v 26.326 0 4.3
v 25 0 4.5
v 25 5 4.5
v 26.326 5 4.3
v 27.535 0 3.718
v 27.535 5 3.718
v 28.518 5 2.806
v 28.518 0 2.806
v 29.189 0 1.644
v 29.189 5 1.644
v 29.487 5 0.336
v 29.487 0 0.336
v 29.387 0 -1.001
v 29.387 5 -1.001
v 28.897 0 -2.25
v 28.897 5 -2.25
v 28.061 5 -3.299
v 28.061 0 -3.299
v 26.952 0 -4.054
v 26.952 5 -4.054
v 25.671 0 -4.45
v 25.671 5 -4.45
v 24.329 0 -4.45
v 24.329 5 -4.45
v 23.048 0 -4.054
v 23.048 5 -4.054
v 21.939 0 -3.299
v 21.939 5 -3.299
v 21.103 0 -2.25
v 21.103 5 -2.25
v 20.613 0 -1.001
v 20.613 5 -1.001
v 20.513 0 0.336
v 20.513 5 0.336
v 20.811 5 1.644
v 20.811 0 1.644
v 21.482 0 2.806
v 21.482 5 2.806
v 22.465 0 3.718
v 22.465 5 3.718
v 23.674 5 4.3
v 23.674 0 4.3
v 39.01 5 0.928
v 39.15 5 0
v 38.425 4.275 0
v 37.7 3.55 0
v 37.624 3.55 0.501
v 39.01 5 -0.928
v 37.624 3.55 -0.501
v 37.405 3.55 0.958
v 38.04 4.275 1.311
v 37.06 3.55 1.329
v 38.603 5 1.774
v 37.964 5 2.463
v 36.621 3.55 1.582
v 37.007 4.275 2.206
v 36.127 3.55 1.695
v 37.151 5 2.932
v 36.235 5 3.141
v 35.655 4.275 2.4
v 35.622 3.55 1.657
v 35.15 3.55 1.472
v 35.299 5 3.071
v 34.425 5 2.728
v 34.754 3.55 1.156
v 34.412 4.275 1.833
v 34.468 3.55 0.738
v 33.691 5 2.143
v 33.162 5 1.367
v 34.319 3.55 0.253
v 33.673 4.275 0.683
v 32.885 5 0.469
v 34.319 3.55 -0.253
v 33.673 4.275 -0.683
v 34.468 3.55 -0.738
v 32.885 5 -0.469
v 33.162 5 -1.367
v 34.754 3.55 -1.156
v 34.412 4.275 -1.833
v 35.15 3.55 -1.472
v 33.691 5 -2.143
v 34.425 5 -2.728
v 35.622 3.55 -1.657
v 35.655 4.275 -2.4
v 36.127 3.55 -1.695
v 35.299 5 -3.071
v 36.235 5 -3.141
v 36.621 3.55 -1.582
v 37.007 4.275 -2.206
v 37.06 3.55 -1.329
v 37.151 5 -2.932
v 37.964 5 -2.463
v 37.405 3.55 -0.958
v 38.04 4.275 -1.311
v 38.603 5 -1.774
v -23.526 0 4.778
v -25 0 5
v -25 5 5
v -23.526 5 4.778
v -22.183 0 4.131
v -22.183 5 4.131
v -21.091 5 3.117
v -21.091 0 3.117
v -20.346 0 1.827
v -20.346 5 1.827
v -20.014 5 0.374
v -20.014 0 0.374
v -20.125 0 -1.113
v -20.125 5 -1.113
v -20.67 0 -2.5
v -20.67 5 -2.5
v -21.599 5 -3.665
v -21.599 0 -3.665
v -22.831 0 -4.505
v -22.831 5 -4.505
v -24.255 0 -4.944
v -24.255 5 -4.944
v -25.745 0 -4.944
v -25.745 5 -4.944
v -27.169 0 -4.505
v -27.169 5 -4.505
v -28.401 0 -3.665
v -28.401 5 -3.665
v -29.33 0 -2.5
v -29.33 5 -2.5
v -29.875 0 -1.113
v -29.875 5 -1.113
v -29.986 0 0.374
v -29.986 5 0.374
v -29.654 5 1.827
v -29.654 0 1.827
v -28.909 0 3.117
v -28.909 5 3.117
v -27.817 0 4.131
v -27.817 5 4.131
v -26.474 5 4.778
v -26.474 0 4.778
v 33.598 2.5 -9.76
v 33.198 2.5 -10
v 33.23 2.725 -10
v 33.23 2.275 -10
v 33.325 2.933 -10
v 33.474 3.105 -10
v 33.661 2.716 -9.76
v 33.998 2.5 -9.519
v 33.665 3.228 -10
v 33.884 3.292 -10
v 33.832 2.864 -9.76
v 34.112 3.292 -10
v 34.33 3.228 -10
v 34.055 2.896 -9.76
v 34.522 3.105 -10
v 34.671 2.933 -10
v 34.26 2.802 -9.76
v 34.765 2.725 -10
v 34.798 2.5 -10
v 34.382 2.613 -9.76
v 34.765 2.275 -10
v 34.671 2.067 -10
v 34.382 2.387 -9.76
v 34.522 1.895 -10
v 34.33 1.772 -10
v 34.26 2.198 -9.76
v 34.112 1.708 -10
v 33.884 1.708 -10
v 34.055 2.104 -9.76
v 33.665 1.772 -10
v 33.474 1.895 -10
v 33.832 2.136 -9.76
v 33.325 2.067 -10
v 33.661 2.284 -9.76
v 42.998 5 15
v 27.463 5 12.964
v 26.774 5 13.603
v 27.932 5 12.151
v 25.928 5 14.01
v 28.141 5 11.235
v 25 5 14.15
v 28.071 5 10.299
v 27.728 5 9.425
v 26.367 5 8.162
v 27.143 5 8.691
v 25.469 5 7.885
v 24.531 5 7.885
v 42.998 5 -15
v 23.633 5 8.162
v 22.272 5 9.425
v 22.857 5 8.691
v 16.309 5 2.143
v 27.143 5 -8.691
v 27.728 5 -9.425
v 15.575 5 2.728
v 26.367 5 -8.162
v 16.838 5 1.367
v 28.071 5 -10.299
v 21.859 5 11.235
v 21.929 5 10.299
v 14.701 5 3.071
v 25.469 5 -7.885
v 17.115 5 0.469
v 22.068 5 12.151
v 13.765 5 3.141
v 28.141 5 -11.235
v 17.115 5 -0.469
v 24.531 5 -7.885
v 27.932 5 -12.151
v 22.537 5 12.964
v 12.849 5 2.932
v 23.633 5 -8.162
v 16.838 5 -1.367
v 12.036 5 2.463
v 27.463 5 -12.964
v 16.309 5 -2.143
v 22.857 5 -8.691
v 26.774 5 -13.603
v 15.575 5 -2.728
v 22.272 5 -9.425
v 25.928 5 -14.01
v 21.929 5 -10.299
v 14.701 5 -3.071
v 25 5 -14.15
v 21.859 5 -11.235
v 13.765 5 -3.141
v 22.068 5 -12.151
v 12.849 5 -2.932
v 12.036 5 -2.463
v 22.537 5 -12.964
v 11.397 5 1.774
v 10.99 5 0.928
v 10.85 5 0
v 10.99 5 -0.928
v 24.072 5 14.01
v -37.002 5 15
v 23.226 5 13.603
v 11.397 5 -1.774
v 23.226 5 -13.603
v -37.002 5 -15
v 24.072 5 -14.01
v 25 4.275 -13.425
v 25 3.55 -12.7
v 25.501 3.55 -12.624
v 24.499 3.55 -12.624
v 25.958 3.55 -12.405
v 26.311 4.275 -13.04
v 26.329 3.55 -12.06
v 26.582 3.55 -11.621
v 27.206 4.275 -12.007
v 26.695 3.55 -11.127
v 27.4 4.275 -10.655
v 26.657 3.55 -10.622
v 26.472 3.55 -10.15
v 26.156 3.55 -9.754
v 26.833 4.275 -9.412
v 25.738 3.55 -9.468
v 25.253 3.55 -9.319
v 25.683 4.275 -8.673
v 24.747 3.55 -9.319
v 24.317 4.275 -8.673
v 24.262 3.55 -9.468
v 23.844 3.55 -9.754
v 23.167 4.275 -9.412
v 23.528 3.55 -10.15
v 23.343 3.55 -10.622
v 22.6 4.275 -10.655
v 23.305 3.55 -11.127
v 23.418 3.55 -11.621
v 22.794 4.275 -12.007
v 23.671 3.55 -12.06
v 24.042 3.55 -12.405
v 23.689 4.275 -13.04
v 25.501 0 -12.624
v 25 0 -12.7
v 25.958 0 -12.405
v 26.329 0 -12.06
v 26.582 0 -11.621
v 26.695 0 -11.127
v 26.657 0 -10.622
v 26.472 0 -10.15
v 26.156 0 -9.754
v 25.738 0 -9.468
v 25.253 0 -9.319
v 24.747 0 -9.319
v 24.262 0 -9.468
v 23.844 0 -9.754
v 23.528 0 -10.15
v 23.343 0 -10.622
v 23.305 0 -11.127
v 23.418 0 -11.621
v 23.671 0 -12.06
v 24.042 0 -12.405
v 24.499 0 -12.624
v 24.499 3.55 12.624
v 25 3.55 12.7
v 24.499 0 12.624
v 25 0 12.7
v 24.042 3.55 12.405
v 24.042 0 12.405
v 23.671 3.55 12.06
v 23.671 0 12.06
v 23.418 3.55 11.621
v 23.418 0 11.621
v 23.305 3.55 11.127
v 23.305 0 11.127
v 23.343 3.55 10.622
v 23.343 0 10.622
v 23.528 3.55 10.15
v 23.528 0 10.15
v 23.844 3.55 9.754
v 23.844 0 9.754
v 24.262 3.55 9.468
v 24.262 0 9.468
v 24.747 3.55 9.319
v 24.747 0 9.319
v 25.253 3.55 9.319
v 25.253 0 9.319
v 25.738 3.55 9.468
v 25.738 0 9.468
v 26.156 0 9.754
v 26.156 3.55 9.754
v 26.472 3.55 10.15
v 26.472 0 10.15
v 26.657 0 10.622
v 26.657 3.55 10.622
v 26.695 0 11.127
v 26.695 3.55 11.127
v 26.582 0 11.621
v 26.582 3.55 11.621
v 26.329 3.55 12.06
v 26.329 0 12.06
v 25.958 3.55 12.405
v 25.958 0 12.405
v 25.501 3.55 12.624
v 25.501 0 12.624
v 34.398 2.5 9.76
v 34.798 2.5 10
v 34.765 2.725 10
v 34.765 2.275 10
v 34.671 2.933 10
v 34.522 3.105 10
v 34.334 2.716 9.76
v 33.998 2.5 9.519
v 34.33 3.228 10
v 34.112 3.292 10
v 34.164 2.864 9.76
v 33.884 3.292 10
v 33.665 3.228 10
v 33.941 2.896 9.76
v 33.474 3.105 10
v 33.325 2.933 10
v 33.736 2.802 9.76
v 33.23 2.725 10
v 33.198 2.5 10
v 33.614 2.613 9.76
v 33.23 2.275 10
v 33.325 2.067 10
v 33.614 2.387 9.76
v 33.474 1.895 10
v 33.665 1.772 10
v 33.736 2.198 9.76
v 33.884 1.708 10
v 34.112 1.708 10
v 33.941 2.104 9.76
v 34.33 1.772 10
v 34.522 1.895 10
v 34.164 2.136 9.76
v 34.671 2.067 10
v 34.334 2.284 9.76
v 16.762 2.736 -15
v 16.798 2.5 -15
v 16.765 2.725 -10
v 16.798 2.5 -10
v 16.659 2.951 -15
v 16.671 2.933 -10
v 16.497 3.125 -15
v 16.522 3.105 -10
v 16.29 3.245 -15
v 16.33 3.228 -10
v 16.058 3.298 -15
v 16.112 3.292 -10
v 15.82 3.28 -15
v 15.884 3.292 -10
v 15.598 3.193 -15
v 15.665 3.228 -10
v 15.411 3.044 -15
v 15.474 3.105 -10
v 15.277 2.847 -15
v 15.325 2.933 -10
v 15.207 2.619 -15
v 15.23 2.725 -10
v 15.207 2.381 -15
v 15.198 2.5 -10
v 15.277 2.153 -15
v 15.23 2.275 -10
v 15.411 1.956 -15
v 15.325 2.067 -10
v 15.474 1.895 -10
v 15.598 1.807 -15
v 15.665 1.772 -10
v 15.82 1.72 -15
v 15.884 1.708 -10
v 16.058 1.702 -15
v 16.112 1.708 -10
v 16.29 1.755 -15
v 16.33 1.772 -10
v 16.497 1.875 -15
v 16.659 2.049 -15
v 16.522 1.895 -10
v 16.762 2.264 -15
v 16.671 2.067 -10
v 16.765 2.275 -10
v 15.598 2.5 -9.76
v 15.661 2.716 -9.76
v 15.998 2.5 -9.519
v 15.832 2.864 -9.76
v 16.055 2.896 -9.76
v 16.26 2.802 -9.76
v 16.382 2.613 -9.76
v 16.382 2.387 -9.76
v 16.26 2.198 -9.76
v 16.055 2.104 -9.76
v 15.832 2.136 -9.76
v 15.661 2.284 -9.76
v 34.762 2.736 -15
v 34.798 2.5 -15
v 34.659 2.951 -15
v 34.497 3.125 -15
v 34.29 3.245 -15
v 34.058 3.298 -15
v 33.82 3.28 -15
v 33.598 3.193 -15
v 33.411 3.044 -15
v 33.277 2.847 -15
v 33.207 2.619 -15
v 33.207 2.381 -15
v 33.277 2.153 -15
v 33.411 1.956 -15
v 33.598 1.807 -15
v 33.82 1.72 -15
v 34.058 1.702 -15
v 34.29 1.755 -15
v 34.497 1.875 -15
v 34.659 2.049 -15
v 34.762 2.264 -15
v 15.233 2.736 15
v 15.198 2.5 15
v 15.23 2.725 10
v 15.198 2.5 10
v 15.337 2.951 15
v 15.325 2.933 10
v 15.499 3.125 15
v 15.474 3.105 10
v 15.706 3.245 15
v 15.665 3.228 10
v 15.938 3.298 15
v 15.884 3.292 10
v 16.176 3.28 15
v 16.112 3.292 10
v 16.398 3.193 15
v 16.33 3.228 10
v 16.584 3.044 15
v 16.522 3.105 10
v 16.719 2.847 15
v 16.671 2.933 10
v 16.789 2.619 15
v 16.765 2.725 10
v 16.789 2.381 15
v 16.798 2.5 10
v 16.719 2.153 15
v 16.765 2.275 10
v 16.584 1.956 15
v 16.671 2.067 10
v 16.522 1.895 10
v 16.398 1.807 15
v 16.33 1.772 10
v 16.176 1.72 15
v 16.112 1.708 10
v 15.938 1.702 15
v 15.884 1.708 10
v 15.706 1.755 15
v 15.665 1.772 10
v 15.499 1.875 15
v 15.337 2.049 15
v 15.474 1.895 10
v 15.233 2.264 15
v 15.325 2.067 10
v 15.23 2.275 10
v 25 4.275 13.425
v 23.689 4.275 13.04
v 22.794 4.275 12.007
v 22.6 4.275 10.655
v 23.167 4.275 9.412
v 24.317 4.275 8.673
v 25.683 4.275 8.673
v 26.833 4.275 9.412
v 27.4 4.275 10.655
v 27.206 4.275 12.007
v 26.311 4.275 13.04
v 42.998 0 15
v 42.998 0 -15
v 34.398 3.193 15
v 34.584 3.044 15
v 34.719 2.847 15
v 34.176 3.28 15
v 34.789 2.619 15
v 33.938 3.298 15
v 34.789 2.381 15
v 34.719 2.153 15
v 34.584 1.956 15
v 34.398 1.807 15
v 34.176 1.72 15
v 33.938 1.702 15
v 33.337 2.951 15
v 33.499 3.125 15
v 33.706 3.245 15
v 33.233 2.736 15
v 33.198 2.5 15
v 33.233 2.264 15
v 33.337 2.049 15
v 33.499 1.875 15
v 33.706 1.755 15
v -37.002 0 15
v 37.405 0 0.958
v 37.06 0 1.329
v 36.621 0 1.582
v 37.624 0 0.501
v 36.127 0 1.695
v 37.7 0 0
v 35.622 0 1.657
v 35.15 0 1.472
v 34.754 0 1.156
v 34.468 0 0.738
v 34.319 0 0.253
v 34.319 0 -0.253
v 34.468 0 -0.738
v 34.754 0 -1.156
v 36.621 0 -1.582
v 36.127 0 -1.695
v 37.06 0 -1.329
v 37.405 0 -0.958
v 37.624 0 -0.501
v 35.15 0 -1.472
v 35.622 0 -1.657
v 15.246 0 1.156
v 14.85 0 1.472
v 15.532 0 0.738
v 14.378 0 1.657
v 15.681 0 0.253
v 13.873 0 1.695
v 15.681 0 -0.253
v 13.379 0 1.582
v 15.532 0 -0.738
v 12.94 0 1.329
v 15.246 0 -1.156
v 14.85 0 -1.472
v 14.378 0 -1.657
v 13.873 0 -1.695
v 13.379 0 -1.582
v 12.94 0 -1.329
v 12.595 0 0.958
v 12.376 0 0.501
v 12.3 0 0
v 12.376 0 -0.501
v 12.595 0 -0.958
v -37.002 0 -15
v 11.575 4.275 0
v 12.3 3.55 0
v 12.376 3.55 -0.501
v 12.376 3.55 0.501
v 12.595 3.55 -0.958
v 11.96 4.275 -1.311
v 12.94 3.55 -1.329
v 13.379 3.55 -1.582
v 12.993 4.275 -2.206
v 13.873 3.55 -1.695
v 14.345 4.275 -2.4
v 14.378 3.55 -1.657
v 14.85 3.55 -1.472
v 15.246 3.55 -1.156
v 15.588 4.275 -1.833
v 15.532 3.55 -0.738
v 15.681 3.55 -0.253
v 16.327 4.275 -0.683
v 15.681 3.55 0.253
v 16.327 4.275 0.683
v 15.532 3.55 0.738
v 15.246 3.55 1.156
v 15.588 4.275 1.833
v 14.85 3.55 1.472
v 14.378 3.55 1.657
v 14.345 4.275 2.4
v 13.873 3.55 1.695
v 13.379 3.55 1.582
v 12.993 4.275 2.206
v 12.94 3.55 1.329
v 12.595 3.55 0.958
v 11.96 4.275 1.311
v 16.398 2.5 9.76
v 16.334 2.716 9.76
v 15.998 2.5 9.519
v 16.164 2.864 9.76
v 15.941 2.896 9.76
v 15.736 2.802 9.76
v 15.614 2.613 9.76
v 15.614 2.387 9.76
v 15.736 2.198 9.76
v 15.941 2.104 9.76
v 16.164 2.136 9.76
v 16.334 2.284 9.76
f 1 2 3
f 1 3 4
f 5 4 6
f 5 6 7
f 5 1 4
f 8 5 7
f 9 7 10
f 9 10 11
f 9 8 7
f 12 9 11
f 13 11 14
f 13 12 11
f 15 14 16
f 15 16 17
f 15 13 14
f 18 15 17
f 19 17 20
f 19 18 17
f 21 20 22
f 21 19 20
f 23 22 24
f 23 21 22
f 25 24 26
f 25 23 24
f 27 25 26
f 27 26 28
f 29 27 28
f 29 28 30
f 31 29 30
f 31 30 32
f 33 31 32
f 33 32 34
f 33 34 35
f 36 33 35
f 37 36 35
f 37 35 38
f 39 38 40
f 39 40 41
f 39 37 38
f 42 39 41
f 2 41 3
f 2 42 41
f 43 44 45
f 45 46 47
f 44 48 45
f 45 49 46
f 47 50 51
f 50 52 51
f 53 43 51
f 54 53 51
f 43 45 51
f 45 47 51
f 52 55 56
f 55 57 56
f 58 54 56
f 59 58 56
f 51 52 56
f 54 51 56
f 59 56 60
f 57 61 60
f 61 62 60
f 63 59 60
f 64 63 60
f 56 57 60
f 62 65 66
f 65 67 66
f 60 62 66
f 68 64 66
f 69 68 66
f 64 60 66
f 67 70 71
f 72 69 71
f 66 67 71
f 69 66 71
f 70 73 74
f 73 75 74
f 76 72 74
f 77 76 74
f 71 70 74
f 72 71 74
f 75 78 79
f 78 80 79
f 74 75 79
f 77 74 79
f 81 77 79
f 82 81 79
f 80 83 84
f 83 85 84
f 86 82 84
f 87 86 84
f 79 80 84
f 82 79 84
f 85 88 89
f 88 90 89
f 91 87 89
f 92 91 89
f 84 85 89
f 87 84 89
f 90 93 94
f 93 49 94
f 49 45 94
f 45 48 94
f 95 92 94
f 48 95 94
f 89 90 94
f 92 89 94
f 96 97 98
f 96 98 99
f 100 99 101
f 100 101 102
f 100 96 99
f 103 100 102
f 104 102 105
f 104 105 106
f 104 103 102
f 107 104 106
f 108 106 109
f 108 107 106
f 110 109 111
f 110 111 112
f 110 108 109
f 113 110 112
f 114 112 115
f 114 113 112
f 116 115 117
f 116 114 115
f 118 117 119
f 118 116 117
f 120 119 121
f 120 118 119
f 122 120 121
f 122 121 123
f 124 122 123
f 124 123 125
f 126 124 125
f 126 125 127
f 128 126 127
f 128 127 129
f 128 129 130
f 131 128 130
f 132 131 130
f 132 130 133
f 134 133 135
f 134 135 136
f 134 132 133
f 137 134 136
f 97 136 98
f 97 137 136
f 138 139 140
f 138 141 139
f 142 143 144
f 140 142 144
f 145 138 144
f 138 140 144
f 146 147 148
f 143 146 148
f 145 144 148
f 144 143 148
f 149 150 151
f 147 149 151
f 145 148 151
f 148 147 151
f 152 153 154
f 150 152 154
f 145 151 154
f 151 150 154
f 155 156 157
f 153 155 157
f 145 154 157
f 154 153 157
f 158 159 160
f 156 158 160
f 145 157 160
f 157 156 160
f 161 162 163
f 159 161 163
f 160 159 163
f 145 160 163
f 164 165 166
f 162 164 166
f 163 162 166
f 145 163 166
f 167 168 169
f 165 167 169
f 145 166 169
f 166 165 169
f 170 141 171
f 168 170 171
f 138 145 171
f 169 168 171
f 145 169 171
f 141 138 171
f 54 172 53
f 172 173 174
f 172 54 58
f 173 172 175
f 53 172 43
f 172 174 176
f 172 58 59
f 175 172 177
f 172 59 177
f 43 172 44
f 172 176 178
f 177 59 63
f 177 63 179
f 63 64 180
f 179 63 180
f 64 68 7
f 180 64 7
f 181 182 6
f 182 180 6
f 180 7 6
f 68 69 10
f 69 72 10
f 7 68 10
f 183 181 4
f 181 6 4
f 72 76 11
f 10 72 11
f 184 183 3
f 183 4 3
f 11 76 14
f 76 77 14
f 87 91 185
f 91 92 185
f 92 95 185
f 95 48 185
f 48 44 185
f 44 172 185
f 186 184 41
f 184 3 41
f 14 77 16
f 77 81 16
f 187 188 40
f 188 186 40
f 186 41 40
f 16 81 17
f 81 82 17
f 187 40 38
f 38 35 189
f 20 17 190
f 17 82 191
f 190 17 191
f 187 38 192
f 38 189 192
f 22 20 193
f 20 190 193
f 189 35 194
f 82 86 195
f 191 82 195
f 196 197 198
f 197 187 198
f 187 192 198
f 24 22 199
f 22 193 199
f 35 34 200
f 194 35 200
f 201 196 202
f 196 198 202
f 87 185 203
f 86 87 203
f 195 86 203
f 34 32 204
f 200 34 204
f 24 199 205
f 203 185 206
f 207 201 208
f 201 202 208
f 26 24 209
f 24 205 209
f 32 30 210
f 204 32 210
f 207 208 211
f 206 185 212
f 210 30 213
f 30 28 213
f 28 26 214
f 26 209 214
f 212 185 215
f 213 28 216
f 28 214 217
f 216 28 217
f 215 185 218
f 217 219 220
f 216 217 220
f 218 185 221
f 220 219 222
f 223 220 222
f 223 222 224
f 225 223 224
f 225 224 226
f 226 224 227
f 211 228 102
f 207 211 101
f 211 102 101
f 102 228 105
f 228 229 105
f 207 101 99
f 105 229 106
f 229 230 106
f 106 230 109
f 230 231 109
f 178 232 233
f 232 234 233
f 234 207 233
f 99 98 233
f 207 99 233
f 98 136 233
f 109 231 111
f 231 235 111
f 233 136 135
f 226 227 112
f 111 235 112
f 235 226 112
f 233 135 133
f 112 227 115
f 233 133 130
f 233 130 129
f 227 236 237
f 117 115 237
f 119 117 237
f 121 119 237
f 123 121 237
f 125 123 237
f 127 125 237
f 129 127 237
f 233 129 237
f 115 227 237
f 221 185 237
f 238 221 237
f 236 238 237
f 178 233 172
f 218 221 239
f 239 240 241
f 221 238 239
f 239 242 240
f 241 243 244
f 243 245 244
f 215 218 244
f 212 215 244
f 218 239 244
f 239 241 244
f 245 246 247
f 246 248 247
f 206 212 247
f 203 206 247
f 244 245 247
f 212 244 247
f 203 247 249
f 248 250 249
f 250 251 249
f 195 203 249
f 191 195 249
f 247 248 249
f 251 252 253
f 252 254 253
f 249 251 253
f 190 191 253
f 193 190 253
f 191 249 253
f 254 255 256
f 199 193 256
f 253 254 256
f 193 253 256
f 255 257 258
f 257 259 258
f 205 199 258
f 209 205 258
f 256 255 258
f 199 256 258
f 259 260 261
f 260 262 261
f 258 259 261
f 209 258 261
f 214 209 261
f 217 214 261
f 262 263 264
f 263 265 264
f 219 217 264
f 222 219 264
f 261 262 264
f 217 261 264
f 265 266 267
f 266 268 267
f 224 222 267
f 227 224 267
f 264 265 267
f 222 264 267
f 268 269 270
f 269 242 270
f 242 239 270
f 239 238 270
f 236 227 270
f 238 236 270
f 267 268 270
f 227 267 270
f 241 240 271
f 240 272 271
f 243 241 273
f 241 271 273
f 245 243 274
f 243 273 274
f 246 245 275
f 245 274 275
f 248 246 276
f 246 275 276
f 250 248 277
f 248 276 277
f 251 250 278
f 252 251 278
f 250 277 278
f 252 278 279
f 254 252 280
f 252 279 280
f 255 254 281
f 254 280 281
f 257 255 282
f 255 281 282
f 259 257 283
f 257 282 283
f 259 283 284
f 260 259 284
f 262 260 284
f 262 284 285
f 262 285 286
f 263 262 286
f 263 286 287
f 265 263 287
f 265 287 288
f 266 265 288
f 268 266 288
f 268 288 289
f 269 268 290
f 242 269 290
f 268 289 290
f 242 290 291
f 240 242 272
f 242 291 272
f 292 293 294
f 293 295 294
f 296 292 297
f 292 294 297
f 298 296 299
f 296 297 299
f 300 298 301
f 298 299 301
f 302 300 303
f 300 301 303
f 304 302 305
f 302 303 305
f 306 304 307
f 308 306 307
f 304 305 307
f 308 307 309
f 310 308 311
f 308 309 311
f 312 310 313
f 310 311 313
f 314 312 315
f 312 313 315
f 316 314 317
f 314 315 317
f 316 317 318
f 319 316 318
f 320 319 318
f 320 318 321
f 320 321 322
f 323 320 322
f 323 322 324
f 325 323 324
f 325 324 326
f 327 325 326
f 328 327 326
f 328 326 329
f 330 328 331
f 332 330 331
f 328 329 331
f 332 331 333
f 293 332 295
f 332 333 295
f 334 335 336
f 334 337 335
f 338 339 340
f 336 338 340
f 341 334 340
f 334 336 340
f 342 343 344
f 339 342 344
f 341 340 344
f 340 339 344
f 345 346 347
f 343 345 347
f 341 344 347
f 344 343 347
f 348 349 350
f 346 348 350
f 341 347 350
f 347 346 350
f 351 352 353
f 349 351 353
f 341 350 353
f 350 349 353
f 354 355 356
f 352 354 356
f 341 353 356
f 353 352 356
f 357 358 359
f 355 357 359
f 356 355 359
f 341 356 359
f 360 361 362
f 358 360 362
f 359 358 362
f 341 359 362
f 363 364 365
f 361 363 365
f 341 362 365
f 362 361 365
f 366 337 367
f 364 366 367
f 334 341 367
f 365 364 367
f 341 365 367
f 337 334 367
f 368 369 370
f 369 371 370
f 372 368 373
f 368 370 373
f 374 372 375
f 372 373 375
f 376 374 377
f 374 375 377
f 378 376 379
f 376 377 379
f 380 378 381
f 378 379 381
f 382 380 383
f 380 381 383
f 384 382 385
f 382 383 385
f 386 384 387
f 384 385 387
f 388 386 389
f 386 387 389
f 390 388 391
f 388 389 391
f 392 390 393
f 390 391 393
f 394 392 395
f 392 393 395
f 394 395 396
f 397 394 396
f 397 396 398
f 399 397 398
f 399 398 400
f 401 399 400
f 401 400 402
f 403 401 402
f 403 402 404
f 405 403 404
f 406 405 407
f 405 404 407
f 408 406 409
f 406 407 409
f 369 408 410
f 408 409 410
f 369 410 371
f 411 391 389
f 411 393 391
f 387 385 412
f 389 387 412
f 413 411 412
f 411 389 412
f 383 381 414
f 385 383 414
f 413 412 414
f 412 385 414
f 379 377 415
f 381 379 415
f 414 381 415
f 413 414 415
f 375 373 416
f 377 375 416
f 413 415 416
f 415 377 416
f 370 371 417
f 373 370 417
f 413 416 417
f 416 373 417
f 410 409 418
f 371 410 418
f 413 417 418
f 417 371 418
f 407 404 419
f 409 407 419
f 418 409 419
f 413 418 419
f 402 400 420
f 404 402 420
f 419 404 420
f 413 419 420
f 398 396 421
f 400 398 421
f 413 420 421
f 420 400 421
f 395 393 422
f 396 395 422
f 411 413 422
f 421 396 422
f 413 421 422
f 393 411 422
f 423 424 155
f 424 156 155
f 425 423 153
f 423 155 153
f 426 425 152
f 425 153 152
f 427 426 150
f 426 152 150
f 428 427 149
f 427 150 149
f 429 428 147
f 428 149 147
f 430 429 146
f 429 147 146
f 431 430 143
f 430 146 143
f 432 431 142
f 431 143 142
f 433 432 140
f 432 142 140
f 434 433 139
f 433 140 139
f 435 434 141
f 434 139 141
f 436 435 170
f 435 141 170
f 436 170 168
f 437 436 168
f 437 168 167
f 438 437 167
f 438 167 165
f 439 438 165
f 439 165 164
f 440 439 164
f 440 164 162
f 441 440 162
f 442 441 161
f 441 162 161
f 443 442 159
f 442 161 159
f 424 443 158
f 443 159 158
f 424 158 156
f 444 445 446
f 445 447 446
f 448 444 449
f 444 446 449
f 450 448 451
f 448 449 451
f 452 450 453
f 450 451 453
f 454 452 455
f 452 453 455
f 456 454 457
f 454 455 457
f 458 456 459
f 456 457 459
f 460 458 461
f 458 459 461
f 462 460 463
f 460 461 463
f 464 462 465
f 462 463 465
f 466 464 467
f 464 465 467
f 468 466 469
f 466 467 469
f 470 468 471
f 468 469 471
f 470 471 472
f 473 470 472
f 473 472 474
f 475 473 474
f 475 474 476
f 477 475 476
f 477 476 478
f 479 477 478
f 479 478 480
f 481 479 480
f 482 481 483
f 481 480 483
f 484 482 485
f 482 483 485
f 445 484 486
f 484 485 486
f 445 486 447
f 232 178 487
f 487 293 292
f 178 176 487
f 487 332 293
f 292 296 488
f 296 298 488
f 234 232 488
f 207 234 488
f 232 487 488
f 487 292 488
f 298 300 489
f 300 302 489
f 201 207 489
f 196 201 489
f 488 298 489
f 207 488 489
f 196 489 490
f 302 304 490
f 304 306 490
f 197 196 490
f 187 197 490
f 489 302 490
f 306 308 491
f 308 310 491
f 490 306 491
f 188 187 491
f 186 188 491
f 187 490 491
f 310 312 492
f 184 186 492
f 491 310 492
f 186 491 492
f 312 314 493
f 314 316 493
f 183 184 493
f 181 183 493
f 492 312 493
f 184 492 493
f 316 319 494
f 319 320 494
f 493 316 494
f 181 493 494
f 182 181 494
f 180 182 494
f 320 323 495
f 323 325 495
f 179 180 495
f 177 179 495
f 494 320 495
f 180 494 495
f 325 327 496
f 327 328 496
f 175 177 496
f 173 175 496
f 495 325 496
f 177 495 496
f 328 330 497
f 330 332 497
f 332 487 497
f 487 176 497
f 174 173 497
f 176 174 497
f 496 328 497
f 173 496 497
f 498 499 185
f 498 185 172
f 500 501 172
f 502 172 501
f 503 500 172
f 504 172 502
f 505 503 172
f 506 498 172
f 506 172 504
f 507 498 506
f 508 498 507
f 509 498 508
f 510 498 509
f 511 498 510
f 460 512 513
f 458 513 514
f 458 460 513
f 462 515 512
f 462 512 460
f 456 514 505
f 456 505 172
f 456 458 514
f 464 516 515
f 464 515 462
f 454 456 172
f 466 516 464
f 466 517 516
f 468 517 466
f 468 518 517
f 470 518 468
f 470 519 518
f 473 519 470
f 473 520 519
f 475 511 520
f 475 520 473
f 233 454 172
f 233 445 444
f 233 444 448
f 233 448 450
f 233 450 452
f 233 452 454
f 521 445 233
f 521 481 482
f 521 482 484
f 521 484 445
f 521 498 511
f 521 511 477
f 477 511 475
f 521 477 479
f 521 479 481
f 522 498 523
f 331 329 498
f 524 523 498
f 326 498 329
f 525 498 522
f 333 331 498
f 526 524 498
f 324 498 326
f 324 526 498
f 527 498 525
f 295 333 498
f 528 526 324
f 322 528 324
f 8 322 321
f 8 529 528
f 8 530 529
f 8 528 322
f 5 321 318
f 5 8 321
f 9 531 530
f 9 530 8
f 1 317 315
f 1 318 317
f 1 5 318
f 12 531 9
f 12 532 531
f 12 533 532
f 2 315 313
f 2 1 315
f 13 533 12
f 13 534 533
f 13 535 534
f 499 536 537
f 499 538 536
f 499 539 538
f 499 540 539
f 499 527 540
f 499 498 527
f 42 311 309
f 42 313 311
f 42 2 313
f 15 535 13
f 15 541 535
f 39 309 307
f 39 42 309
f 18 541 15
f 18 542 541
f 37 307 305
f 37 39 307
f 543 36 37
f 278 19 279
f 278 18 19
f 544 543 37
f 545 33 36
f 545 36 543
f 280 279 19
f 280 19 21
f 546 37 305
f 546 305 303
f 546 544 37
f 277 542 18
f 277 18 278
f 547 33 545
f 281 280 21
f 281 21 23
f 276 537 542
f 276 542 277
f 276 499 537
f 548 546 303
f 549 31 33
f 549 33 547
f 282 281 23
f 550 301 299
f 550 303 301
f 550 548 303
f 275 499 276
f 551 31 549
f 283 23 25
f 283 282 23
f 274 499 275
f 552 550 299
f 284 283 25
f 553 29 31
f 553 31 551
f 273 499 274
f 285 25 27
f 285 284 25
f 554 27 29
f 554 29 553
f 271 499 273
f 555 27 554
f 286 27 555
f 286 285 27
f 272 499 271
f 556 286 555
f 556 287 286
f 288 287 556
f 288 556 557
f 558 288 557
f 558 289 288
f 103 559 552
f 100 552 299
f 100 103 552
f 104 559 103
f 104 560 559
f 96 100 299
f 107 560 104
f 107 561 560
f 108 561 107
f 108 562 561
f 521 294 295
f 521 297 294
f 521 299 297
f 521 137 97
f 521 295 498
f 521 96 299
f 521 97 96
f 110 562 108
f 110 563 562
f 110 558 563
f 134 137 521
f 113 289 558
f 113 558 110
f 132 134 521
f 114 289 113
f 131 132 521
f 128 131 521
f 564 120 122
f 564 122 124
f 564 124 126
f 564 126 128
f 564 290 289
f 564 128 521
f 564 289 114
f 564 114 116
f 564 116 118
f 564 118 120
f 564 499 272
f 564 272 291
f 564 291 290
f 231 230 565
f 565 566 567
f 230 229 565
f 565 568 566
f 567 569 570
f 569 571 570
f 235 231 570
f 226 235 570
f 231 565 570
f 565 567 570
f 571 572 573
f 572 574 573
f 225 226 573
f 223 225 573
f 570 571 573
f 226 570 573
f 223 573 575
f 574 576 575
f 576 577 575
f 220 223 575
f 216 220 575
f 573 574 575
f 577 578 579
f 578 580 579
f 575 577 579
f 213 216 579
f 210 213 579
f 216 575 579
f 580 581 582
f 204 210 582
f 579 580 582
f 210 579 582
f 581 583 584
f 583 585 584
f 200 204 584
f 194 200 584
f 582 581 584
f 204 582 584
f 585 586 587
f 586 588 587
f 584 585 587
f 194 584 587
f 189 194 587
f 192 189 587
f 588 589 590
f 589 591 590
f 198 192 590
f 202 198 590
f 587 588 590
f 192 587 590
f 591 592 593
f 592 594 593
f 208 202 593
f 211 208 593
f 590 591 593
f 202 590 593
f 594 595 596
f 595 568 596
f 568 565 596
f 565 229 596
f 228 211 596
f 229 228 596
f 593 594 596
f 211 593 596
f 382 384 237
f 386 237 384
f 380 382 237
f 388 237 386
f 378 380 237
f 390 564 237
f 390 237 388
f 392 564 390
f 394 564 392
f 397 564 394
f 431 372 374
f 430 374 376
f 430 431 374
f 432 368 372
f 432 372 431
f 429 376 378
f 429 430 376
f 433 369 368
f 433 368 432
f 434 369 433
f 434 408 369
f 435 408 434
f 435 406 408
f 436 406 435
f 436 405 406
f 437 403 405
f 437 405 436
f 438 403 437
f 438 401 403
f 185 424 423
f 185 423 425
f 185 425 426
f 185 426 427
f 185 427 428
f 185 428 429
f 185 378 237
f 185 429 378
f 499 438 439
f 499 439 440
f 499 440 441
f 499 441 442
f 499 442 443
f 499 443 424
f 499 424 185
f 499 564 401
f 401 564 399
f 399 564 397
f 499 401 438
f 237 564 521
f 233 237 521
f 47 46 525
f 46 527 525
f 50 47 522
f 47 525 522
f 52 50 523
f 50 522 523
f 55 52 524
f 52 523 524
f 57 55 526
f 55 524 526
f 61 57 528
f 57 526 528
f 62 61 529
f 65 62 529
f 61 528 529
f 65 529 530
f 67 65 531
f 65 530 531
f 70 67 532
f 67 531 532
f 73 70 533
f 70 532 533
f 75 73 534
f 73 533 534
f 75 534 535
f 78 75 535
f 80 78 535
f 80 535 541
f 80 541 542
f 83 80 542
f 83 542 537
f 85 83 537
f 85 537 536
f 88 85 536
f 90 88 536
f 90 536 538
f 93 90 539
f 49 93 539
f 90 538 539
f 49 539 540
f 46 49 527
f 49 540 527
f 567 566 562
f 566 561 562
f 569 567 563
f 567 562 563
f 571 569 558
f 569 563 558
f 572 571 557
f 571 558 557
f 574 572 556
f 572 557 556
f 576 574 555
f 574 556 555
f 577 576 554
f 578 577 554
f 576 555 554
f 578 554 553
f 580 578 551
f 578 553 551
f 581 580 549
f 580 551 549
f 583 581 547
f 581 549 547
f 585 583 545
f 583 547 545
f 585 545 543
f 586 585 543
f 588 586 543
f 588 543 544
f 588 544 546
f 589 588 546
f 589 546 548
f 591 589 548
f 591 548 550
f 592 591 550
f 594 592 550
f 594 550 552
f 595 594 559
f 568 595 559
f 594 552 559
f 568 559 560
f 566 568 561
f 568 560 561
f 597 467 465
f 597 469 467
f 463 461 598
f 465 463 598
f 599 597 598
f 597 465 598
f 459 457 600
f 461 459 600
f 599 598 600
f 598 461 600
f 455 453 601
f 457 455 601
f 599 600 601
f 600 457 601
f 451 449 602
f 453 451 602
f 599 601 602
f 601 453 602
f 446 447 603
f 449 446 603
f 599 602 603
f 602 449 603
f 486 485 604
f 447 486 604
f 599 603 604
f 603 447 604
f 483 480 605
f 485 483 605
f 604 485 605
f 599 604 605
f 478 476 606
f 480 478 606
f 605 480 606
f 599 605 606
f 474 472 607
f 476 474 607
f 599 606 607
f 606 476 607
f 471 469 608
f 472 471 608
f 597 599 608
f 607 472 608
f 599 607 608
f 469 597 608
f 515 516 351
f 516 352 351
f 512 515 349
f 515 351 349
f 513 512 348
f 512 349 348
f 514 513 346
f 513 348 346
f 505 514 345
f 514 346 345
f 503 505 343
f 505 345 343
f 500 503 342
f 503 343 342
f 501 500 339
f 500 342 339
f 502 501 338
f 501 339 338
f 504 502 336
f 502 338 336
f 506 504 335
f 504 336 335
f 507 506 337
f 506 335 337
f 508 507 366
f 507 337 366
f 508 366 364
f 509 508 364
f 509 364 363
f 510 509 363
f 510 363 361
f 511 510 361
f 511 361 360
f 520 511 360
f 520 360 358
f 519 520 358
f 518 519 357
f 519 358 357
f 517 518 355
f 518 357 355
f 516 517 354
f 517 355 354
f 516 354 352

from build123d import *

# Parameters (mm, degrees)
SKETCH1_R                                           = 5
SKETCH1_R_2                                         = 4.5
BOSS_EXTRUDE2_DEPTH                                 = 5
CSK_FOR_M3_COUNTERSUNK_FLAT_HEAD_SCREW2_D           = 3.4
CSK_FOR_M3_COUNTERSUNK_FLAT_HEAD_SCREW2_CSINK_D     = 6.3
CSK_FOR_M3_COUNTERSUNK_FLAT_HEAD_SCREW2_CSINK_ANGLE = 90
CIRPATTERN2_COUNT                                   = 4
M2_TAPPED_HOLE1_D                                   = 1.6
M2_TAPPED_HOLE1_DEPTH                               = 5
M2_TAPPED_HOLE1_TIP                                 = 0.480688495
M2_TAPPED_HOLE2_D                                   = 1.6
M2_TAPPED_HOLE2_DEPTH                               = 5
M2_TAPPED_HOLE2_TIP                                 = 0.480688495


with BuildPart() as part:
    # Sketch1 → Boss-Extrude2 (new body)
    with BuildSketch(Plane(origin=(0, 0, 0), x_dir=(1, 0, 0), z_dir=(0, 1, 0))):
        Polygon((-37.002207947, 0), (-37.002207947, 15), (42.997792053, 15), (42.997792053, -15), (-37.002207947, -15), align=None)
        with Locations((-25, 0)):
            Circle(SKETCH1_R, mode=Mode.SUBTRACT)
        with Locations((25, 0)):
            Circle(SKETCH1_R_2, mode=Mode.SUBTRACT)
    extrude(amount=BOSS_EXTRUDE2_DEPTH)

    # CSK for M3 Countersunk Flat Head Screw2 (through all)
    with Locations(Plane(origin=(0, 5, 0), x_dir=(1, 0, 0), z_dir=(0, 1, 0))):
        with Locations((14, 0)):
            csk_for_m3_countersunk_flat_head_screw2 = CounterSinkHole(CSK_FOR_M3_COUNTERSUNK_FLAT_HEAD_SCREW2_D / 2, CSK_FOR_M3_COUNTERSUNK_FLAT_HEAD_SCREW2_CSINK_D / 2, counter_sink_angle=CSK_FOR_M3_COUNTERSUNK_FLAT_HEAD_SCREW2_CSINK_ANGLE)

    # CirPattern2: CSK for M3 Countersunk Flat Head Screw2 ×4 about axis
    cirpattern2_axis = Axis((25, 23.075275429, 0), (0, -1, 0))
    for i in range(1, CIRPATTERN2_COUNT):
        add(csk_for_m3_countersunk_flat_head_screw2.rotate(cirpattern2_axis, i * 360 / CIRPATTERN2_COUNT), mode=Mode.SUBTRACT)

    # M2 Tapped Hole1
    with Locations(Plane.XY.offset(15)):
        with Locations((15.997792053, 2.5), (33.997792053, 2.5)):
            Hole(M2_TAPPED_HOLE1_D / 2, depth=M2_TAPPED_HOLE1_DEPTH)
            with Locations((0, 0, -(M2_TAPPED_HOLE1_DEPTH + M2_TAPPED_HOLE1_TIP / 2))):  # 118° drill point
                Cone(0, M2_TAPPED_HOLE1_D / 2, M2_TAPPED_HOLE1_TIP, mode=Mode.SUBTRACT)

    # M2 Tapped Hole2
    with Locations(Plane(origin=(0, 0, -15), x_dir=(-1, 0, 0), z_dir=(0, 0, -1))):
        with Locations((-33.997792053, 2.5), (-15.997792053, 2.5)):
            Hole(M2_TAPPED_HOLE2_D / 2, depth=M2_TAPPED_HOLE2_DEPTH)
            with Locations((0, 0, -(M2_TAPPED_HOLE2_DEPTH + M2_TAPPED_HOLE2_TIP / 2))):  # 118° drill point
                Cone(0, M2_TAPPED_HOLE2_D / 2, M2_TAPPED_HOLE2_TIP, mode=Mode.SUBTRACT)


solid = part.part
